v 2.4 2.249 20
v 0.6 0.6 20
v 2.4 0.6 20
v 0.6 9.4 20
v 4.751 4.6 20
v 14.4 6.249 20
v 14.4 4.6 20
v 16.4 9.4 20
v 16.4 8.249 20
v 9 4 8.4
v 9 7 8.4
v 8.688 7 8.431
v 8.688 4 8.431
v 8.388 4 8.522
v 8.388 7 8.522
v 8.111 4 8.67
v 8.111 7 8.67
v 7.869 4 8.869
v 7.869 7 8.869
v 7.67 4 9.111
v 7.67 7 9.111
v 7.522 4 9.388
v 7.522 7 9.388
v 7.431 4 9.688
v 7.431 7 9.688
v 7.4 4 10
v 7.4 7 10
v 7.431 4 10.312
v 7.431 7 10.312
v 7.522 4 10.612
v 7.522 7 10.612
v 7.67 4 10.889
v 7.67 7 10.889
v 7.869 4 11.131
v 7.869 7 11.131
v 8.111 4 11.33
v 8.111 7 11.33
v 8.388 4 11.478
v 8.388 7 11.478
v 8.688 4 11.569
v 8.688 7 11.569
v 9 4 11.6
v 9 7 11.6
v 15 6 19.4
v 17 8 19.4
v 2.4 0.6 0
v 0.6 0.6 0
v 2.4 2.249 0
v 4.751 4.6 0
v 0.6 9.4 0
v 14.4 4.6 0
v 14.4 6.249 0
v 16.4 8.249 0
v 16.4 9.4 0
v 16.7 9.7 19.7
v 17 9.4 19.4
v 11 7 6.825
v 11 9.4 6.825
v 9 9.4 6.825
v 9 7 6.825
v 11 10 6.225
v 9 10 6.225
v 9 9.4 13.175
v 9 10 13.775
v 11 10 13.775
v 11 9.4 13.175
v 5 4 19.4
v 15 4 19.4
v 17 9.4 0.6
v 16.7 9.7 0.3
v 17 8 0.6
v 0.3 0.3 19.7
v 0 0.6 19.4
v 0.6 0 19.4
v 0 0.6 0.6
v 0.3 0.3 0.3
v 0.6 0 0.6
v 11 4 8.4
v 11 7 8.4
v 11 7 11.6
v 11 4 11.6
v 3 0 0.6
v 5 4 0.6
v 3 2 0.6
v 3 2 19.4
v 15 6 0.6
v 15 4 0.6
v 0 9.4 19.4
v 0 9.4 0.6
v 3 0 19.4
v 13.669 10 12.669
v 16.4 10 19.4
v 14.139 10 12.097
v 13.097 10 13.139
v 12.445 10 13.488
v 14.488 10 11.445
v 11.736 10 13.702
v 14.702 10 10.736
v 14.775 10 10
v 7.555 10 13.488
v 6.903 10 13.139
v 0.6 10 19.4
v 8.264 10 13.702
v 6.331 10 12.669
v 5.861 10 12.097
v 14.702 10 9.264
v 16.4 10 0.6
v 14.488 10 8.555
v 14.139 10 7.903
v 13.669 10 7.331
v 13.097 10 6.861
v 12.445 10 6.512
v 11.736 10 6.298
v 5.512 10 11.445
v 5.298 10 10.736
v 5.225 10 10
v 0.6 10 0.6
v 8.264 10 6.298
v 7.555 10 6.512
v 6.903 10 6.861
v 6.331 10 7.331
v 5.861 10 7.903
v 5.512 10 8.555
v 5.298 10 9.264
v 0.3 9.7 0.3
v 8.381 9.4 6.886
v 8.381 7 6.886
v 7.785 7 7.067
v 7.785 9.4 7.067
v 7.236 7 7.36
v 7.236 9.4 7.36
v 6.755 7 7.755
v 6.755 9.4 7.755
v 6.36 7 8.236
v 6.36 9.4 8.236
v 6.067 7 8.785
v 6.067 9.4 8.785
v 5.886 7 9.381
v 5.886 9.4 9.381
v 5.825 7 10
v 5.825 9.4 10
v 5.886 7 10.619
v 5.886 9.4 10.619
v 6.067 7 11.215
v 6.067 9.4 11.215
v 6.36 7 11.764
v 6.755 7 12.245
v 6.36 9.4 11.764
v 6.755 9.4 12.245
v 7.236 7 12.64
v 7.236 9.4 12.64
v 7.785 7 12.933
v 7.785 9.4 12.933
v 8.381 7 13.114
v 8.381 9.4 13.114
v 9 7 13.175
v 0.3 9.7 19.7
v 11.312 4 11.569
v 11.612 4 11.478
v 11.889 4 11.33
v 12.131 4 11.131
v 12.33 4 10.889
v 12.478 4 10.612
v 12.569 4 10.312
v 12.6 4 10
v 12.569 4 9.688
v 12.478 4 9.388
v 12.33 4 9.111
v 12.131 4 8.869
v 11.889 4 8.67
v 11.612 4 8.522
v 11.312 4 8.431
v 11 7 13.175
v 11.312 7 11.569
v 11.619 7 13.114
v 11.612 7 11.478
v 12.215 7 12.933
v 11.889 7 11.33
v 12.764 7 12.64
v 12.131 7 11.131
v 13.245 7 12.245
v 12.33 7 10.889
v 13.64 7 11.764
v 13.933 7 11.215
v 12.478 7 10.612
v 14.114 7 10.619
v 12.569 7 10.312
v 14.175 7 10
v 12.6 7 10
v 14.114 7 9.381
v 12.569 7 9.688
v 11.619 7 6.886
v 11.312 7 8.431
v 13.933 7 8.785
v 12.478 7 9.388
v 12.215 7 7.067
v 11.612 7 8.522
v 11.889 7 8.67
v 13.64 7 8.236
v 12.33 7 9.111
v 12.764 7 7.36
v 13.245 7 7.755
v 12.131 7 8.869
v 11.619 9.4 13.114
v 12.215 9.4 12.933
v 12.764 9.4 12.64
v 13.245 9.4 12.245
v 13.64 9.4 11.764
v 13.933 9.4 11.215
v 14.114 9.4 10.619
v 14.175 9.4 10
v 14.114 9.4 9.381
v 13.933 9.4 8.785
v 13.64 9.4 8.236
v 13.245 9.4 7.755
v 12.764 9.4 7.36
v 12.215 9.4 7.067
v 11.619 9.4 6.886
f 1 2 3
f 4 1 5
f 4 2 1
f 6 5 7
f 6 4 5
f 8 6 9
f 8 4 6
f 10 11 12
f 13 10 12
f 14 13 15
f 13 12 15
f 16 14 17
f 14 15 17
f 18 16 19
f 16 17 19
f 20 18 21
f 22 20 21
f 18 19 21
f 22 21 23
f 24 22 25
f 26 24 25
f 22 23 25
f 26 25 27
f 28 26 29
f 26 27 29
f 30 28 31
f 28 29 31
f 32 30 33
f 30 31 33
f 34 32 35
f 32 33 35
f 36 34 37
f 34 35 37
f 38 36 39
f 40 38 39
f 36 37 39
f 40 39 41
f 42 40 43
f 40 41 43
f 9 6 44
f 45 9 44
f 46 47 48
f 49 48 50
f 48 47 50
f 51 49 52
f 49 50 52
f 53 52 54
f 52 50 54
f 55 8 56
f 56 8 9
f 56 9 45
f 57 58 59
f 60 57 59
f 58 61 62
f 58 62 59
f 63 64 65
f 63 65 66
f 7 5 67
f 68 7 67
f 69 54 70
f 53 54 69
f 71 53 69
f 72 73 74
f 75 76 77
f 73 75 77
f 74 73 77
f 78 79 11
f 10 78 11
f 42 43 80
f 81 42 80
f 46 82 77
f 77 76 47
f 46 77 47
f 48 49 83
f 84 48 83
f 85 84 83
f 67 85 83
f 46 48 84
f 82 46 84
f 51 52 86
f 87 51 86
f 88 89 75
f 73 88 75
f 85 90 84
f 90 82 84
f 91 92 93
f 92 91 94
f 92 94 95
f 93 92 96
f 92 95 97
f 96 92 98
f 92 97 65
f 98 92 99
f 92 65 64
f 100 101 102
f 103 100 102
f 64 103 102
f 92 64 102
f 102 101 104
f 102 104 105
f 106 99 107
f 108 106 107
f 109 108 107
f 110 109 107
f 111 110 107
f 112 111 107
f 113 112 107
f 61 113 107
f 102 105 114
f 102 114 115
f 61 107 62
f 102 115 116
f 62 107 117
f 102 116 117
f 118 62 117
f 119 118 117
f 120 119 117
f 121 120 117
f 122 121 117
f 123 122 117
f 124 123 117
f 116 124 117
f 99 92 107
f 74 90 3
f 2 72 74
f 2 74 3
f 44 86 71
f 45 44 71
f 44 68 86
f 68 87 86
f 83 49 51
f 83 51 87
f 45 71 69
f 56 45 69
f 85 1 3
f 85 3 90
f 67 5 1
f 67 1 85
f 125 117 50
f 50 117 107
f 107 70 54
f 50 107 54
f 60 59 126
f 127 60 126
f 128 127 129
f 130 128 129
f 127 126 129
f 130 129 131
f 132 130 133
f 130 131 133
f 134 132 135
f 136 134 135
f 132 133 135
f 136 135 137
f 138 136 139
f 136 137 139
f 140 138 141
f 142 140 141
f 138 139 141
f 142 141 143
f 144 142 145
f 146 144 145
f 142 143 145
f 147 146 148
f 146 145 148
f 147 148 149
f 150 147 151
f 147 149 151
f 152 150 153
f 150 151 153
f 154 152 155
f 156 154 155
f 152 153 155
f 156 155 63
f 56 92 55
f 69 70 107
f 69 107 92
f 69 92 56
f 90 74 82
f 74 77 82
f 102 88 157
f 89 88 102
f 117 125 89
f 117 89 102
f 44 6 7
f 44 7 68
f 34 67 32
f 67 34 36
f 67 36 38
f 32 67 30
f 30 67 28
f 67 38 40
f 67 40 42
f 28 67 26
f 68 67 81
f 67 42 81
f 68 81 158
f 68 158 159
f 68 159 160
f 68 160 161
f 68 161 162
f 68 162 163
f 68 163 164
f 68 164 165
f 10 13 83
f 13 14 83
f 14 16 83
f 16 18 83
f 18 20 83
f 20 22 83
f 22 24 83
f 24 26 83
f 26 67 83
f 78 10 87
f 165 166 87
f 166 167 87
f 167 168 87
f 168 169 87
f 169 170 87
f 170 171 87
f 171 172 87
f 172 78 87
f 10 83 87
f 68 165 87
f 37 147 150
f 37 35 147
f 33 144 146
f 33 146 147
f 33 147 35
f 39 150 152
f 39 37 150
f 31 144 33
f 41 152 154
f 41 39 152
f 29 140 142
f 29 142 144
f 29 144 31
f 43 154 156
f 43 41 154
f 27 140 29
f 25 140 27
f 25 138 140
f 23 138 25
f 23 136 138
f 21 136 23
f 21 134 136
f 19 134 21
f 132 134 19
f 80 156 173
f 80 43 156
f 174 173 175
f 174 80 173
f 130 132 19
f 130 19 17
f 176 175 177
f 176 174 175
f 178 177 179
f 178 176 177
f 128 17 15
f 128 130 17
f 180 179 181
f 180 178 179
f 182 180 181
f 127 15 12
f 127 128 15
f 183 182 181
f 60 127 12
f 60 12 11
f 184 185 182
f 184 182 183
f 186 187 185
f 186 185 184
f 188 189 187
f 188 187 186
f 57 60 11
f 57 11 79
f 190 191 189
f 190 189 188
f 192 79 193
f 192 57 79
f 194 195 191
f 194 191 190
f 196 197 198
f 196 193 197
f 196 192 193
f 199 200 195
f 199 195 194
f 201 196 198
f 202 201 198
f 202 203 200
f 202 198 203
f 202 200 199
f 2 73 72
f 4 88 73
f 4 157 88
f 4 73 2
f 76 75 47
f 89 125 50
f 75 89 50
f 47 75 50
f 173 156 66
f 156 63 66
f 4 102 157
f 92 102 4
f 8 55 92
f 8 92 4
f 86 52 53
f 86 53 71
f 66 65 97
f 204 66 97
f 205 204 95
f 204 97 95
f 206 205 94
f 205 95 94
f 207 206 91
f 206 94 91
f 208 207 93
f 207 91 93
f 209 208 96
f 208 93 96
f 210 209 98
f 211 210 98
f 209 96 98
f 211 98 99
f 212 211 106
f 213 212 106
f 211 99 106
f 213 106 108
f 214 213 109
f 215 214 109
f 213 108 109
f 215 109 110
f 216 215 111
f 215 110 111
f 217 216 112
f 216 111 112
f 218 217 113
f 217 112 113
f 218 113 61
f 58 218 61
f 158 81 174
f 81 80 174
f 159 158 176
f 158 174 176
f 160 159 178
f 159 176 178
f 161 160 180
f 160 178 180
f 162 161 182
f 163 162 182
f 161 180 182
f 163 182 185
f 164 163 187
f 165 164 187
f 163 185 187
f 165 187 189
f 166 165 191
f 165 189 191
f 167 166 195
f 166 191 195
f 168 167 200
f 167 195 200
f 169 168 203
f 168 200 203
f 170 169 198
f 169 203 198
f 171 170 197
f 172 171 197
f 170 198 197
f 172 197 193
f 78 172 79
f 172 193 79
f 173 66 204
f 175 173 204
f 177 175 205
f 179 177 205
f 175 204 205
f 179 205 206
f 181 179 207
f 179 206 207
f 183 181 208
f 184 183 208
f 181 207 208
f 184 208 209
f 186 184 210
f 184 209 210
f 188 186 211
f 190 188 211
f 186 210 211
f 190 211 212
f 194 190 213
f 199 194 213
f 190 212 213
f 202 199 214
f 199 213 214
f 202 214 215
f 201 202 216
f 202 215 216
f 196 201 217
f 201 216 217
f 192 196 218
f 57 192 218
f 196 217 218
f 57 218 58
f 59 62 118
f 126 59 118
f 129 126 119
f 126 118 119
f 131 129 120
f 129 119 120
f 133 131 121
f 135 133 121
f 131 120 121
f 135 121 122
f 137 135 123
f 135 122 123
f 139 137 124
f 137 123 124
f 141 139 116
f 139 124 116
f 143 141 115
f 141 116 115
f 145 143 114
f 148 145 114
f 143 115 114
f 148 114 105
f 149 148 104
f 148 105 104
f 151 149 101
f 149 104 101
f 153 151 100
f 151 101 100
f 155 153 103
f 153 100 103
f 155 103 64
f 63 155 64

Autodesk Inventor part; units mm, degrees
ref_plane "YZ Plane" through (0, 0, 0) normal (1, 0, 0) x (0, 1, 0)
ref_plane "XZ Plane" through (0, 0, 0) normal (0, 1, 0) x (-1, 0, 0)
ref_plane "XY Plane" through (0, 0, 0) normal (0, 0, 1) x (1, 0, 0)
sketch "Sketch1" plane through (0, 0, 0) normal (0, 0, 1) x (1, 0, 0)
  line L0 (0, 0) -> (3, 0)
  line L1 (3, 0) -> (3, 2)
  line L2 (3, 2) -> (5, 4)
  line L3 (5, 4) -> (15, 4)
  line L4 (17, 10) -> (0, 10)
  line L5 (0, 10) -> (0, 0)
  line L6 (15, 4) -> (15, 6)
  line L7 (15, 6) -> (17, 8)
  line L8 (17, 8) -> (17, 10)
  dimension "d0" = 45
  dimension "d2" = 3
  dimension "d4" = 10
  dimension "d6" = 2
  dimension "d7" = 2
  dimension "d8" = 2
  dimension "d25" = 2
extrude "Extrusion1" add sketch "Sketch1" along normal blind 20
sketch "Sketch2" plane through (0, 10, 0) normal (0, 1, 0) x (1, 0, 0)
  line L0 (7.4, -10) -> (12.6, -10) construction
  line L1 (9, -11.6) -> (11, -11.6)
  line L2 (11, -8.4) -> (9, -8.4)
  arc A0 (9, -8.4) -> (9, -11.6) centre (9, -10) ccw
  arc A1 (11, -11.6) -> (11, -8.4) centre (11, -10) ccw
  line L3 (9, -10) -> (11, -10) construction
  line L4 (9, -13.175) -> (11, -13.175)
  line L5 (11, -6.825) -> (9, -6.825)
  arc A2 (9, -6.825) -> (9, -13.175) centre (9, -10) ccw
  arc A3 (11, -13.175) -> (11, -6.825) centre (11, -10) ccw
  line L6 (5, 0) -> (15, 0) construction
  line L7 (15, 0) -> (15, -20) construction
  line L8 (5, -20) -> (15, -20) construction
  line L9 (5, 0) -> (5, -20) construction
  point P0 (10, -10)
  point P1 (7.4, -10)
  point P2 (12.6, -10)
  point P3 (5.825, -10)
  point P4 (10, -20)
  point P5 (5, -10)
  dimension "d11" = 3.2
  dimension "d16" = 6.35
  dimension "d24" = 2
extrude "Extrusion2" cut sketch "Sketch2" against normal through all contours A0 L2 A1 L1
extrude "Extrusion3" cut sketch "Sketch2" against normal blind 3 contours A0 L2 A1 L1 | A2 L5 A3 L4
chamfer "Chamfer1" distance 0.6 angle 45 25 edges at (8.5, 10, 20) (8.5, 10, 0) (0, 10, 10) (0, 5, 20) (0, 5, 0) (0, 0, 10) (1.5, 0, 20) (1.5, 0, 0) (16, 7, 20) (15, 5, 20) (10, 4, 20) (4, 3, 20) (3, 1, 20) (3, 1, 0) (4, 3, 0) (10, 4, 0) (15, 5, 0) (16, 7, 0) (14.175, 10, 10) (10, 10, 13.175) (5.825, 10, 10) (10, 10, 6.825) (17, 9, 20) (17, 9, 0) (17, 10, 10)
equation "\"d7\" = d6"
equation "\"d8\" = d7"
equation "\"d25\" = d7"
